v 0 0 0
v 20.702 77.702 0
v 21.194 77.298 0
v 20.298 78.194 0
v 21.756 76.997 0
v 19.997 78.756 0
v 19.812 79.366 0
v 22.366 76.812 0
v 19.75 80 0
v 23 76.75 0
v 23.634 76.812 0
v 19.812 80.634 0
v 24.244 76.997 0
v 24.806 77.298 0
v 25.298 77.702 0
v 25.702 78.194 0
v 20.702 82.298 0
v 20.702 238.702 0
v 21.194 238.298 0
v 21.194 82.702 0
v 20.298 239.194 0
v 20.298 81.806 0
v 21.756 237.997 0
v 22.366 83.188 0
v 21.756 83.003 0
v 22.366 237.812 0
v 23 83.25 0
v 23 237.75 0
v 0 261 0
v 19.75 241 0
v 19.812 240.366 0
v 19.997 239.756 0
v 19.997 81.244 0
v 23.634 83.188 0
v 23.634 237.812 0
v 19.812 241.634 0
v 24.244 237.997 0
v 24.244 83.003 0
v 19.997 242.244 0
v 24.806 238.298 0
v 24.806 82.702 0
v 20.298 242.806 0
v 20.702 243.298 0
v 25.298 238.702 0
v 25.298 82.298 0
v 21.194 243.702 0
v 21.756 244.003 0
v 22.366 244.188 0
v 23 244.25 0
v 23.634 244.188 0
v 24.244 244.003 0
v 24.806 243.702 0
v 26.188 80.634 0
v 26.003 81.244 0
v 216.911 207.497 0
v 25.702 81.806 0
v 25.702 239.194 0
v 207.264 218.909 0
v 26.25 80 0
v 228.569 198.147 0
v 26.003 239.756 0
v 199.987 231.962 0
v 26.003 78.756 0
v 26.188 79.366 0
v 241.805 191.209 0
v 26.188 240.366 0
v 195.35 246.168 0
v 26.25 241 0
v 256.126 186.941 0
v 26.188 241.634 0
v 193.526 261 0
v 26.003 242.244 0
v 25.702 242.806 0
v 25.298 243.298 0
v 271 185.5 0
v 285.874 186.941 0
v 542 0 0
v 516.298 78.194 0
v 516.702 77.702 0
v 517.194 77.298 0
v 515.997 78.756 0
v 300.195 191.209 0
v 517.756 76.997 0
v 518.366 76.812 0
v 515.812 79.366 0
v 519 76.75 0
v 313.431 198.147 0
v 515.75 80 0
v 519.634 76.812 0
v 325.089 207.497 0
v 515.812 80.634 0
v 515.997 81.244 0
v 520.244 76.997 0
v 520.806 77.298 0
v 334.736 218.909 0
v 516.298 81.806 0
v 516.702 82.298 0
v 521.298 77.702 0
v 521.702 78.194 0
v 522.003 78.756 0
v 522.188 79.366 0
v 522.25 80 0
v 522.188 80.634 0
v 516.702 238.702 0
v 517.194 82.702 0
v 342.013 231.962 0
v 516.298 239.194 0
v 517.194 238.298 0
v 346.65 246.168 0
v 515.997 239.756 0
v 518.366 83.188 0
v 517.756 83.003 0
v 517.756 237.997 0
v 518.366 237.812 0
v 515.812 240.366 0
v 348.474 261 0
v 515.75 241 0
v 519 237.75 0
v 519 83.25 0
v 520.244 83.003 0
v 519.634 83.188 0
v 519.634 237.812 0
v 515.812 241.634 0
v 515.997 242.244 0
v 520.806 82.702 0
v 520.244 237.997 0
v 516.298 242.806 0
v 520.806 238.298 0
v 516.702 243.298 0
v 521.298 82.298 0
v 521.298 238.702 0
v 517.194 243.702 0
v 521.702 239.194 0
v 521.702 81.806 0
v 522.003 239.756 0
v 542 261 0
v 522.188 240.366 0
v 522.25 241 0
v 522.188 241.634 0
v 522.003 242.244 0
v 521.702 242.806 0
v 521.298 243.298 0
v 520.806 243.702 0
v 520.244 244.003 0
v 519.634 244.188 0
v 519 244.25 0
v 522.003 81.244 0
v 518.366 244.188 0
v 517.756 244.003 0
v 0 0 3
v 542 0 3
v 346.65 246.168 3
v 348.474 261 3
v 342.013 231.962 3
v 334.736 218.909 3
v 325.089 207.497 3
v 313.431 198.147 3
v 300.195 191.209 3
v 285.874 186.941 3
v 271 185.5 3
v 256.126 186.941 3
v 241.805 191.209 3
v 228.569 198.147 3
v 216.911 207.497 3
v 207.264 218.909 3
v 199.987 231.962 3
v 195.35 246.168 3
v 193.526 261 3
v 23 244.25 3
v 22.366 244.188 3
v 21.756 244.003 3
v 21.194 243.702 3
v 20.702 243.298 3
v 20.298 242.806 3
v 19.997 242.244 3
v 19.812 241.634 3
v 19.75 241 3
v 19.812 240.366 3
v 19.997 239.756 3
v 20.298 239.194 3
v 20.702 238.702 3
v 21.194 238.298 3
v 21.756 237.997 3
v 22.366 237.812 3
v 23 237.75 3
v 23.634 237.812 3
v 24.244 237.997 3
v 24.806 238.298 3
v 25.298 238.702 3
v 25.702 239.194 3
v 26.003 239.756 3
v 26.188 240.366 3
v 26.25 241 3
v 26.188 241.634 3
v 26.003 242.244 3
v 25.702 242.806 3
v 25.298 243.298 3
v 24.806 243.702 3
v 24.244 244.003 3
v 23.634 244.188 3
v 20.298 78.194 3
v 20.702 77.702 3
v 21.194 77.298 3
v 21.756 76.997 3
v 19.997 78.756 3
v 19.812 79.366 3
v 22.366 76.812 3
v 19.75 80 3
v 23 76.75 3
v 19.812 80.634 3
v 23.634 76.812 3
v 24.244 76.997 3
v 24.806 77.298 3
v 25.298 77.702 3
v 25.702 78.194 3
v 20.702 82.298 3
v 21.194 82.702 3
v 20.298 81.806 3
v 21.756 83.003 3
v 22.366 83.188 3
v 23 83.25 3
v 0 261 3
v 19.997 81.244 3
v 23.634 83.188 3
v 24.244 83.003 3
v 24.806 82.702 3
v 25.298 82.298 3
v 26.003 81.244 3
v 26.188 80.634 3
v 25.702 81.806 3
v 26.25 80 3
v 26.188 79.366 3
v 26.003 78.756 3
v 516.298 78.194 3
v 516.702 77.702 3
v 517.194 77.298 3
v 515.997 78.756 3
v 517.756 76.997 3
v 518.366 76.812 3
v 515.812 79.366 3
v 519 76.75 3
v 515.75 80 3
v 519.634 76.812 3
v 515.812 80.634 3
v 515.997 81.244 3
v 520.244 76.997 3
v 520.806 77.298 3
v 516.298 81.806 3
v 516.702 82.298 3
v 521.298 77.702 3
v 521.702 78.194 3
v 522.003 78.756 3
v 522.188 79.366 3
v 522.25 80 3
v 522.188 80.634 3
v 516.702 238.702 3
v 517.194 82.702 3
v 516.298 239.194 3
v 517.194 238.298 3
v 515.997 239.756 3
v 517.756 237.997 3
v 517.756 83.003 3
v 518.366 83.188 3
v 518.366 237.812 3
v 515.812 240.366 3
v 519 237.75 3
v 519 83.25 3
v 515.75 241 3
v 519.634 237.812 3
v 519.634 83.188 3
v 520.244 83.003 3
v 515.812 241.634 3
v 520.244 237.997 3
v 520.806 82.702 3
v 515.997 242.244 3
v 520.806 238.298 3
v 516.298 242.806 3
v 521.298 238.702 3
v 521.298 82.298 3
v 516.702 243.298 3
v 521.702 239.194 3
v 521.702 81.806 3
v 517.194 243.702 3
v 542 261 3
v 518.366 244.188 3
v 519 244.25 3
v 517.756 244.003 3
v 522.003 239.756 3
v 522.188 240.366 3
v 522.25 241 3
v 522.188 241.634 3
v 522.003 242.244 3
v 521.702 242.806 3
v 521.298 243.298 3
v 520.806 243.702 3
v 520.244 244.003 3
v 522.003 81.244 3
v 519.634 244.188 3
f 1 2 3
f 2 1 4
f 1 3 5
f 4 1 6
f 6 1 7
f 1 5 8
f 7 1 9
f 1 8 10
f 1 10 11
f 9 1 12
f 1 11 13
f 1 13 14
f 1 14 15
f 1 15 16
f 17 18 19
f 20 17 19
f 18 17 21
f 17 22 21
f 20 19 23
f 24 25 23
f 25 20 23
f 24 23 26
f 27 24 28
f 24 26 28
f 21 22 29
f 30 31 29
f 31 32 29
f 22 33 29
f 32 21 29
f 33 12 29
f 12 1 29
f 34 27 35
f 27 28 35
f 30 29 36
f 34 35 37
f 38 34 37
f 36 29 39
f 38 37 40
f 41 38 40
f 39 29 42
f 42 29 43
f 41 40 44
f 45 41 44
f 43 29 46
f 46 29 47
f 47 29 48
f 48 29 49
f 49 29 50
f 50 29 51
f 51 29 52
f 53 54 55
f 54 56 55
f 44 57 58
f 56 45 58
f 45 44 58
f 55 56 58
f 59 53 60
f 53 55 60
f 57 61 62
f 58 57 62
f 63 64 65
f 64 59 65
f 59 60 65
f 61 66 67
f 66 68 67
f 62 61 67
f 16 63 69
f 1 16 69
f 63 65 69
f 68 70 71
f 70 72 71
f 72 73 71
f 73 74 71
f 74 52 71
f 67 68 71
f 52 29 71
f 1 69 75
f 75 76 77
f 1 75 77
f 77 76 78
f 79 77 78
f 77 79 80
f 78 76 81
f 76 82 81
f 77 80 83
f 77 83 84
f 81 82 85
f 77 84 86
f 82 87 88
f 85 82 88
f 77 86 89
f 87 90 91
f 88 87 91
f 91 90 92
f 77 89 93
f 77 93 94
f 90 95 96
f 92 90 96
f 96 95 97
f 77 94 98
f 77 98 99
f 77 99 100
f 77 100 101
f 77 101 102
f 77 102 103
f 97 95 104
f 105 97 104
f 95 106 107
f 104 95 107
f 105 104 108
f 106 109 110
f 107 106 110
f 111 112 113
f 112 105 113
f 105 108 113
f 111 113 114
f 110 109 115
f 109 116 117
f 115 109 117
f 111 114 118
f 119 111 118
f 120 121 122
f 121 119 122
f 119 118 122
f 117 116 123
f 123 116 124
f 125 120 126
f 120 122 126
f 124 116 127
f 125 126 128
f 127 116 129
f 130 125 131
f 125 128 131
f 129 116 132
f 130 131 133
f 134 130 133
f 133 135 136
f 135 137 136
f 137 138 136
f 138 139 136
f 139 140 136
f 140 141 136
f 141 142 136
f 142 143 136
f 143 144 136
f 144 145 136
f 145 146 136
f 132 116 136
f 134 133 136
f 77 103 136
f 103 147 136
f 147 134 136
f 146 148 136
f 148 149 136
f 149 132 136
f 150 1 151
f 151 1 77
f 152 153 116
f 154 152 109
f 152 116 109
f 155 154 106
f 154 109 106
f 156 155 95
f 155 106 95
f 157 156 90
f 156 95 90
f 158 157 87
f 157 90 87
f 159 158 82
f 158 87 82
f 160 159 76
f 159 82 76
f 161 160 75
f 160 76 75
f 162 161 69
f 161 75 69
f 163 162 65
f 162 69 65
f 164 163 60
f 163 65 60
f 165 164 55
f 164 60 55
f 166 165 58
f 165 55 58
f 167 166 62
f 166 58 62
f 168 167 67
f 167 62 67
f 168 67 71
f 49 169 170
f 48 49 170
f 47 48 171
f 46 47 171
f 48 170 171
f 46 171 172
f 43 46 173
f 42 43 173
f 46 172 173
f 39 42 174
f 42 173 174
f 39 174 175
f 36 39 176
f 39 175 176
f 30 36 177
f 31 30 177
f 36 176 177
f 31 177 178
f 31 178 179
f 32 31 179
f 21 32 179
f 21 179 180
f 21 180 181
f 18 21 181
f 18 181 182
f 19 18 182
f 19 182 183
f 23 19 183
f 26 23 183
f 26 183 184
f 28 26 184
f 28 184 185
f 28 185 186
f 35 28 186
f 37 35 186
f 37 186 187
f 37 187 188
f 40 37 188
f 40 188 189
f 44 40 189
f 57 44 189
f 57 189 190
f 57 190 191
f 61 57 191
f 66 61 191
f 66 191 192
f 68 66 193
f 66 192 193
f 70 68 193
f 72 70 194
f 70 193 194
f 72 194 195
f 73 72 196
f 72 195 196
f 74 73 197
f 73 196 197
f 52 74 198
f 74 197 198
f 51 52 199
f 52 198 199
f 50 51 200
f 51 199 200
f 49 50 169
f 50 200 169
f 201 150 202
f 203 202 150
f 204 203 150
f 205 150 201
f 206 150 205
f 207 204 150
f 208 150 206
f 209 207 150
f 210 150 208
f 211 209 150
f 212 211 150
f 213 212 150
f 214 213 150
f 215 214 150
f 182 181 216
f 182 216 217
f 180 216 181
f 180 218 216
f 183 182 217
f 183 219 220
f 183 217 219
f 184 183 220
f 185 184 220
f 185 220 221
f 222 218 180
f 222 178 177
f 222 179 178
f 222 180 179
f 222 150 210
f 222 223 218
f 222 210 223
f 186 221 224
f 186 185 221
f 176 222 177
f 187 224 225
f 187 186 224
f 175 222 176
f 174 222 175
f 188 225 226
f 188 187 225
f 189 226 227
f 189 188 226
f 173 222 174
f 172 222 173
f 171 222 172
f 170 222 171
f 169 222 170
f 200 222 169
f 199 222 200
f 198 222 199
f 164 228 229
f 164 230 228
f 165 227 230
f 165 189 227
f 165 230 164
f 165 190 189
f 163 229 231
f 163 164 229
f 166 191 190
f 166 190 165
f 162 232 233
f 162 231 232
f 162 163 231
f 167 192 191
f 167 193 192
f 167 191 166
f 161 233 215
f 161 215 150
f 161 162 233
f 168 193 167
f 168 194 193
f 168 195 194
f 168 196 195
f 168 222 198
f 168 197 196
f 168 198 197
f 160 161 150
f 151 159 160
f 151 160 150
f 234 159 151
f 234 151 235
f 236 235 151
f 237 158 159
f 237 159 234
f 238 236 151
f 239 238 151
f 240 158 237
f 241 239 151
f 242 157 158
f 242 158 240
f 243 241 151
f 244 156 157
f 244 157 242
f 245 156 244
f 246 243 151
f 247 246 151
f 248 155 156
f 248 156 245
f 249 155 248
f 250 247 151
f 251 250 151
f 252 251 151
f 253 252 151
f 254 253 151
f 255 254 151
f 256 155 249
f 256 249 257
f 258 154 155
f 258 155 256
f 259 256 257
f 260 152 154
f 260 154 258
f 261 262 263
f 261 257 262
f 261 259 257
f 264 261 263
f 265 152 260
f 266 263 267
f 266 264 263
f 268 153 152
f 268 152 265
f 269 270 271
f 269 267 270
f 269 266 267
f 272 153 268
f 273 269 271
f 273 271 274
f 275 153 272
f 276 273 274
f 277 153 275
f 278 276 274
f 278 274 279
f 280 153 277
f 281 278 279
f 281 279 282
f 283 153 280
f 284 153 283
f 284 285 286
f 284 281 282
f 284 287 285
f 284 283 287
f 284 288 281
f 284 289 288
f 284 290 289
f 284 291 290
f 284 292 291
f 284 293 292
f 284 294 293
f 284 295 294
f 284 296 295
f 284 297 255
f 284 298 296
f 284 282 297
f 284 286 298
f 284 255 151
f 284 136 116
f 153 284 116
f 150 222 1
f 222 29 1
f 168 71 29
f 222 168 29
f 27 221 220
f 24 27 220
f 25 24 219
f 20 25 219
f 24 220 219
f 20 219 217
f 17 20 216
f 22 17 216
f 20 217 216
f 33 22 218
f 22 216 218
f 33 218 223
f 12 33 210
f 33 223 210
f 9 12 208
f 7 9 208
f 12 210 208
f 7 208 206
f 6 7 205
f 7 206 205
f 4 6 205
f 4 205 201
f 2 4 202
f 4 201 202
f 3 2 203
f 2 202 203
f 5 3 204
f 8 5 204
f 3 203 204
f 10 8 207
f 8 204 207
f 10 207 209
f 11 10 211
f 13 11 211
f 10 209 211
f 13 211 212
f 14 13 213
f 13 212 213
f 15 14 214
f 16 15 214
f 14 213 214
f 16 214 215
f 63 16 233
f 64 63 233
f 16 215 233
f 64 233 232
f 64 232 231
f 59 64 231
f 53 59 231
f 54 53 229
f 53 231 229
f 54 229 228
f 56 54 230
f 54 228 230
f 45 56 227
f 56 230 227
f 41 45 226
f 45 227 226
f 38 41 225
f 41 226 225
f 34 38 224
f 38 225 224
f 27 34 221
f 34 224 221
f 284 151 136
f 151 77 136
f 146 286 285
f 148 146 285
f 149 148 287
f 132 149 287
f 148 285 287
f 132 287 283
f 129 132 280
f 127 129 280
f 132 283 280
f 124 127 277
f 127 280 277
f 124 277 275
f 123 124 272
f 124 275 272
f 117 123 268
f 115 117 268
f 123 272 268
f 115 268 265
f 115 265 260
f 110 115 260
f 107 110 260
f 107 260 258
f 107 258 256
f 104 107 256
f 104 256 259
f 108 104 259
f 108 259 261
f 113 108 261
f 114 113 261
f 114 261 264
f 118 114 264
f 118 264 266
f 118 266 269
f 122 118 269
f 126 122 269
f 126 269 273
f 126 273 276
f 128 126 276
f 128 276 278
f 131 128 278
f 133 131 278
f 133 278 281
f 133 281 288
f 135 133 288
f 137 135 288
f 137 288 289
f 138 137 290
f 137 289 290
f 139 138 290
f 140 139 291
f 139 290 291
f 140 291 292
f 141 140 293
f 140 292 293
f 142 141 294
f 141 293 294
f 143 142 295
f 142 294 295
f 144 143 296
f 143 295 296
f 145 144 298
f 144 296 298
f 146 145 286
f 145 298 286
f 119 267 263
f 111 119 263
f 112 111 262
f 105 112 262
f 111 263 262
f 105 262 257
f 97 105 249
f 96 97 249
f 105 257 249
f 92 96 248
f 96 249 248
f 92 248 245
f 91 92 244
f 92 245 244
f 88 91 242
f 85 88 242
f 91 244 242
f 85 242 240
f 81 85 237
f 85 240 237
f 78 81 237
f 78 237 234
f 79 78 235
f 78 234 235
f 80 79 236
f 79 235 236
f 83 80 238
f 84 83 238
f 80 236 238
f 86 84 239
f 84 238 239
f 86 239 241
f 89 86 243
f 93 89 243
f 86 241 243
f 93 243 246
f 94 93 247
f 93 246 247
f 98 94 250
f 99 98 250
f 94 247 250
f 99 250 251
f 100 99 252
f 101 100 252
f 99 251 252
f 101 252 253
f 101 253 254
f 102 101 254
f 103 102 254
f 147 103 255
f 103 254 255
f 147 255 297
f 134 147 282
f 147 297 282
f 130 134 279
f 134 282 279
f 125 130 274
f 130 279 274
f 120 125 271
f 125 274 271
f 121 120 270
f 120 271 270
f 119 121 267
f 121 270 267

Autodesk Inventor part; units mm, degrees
ref_plane "YZ Plane" through (0, 0, 0) normal (1, 0, 0) x (0, 1, 0)
ref_plane "XZ Plane" through (0, 0, 0) normal (0, 1, 0) x (-1, 0, 0)
ref_plane "XY Plane" through (0, 0, 0) normal (0, 0, 1) x (1, 0, 0)
sketch "Sketch1" plane through (0, 0, 0) normal (0, 0, 1) x (1, 0, 0)
  line L0 (0, 0) -> (542, 0)
  line L1 (542, 0) -> (542, 261)
  line L2 (0, 261) -> (0, 0)
  line L3 (271, 0) -> (271, 263)
  arc A0 (193.5258, 261) -> (348.4742, 261) centre (271, 263) ccw
  line L4 (542, 261) -> (348.4742, 261)
  line L5 (193.5258, 261) -> (0, 261)
  dimension "d0" = 542
  dimension "d24" = 155
  dimension "d25" = 263
  dimension "d26" = 261
extrude "Extrusion1" add sketch "Sketch1" along normal blind 3
sketch "Sketch2" plane through (0, 0, 0) normal (0, 0, -1) x (-1, 0, 0)
  line L0 (0, 261) -> (0, 0) projected
  line L1 (-542, 0) -> (-542, 261) projected
  line L2 (-542, 261) -> (0, 261) projected
  point P0 (-23, 241)
  point P1 (-23, 80)
  point P2 (-519, 241)
  point P3 (-519, 80)
  dimension "d4" = 23
  dimension "d13" = 20
  dimension "d14" = 261
  dimension "d15" = 542
  dimension "d18" = 161
  dimension "d21" = 496
hole "Hole1" at (23, 241, 0) at (519, 241, 0) at (519, 80, 0) at (23, 80, 0) direction (0, 0, 1) diameter 6.5 end through all
properties part number "plate_top_03" material "Polystyrene"
